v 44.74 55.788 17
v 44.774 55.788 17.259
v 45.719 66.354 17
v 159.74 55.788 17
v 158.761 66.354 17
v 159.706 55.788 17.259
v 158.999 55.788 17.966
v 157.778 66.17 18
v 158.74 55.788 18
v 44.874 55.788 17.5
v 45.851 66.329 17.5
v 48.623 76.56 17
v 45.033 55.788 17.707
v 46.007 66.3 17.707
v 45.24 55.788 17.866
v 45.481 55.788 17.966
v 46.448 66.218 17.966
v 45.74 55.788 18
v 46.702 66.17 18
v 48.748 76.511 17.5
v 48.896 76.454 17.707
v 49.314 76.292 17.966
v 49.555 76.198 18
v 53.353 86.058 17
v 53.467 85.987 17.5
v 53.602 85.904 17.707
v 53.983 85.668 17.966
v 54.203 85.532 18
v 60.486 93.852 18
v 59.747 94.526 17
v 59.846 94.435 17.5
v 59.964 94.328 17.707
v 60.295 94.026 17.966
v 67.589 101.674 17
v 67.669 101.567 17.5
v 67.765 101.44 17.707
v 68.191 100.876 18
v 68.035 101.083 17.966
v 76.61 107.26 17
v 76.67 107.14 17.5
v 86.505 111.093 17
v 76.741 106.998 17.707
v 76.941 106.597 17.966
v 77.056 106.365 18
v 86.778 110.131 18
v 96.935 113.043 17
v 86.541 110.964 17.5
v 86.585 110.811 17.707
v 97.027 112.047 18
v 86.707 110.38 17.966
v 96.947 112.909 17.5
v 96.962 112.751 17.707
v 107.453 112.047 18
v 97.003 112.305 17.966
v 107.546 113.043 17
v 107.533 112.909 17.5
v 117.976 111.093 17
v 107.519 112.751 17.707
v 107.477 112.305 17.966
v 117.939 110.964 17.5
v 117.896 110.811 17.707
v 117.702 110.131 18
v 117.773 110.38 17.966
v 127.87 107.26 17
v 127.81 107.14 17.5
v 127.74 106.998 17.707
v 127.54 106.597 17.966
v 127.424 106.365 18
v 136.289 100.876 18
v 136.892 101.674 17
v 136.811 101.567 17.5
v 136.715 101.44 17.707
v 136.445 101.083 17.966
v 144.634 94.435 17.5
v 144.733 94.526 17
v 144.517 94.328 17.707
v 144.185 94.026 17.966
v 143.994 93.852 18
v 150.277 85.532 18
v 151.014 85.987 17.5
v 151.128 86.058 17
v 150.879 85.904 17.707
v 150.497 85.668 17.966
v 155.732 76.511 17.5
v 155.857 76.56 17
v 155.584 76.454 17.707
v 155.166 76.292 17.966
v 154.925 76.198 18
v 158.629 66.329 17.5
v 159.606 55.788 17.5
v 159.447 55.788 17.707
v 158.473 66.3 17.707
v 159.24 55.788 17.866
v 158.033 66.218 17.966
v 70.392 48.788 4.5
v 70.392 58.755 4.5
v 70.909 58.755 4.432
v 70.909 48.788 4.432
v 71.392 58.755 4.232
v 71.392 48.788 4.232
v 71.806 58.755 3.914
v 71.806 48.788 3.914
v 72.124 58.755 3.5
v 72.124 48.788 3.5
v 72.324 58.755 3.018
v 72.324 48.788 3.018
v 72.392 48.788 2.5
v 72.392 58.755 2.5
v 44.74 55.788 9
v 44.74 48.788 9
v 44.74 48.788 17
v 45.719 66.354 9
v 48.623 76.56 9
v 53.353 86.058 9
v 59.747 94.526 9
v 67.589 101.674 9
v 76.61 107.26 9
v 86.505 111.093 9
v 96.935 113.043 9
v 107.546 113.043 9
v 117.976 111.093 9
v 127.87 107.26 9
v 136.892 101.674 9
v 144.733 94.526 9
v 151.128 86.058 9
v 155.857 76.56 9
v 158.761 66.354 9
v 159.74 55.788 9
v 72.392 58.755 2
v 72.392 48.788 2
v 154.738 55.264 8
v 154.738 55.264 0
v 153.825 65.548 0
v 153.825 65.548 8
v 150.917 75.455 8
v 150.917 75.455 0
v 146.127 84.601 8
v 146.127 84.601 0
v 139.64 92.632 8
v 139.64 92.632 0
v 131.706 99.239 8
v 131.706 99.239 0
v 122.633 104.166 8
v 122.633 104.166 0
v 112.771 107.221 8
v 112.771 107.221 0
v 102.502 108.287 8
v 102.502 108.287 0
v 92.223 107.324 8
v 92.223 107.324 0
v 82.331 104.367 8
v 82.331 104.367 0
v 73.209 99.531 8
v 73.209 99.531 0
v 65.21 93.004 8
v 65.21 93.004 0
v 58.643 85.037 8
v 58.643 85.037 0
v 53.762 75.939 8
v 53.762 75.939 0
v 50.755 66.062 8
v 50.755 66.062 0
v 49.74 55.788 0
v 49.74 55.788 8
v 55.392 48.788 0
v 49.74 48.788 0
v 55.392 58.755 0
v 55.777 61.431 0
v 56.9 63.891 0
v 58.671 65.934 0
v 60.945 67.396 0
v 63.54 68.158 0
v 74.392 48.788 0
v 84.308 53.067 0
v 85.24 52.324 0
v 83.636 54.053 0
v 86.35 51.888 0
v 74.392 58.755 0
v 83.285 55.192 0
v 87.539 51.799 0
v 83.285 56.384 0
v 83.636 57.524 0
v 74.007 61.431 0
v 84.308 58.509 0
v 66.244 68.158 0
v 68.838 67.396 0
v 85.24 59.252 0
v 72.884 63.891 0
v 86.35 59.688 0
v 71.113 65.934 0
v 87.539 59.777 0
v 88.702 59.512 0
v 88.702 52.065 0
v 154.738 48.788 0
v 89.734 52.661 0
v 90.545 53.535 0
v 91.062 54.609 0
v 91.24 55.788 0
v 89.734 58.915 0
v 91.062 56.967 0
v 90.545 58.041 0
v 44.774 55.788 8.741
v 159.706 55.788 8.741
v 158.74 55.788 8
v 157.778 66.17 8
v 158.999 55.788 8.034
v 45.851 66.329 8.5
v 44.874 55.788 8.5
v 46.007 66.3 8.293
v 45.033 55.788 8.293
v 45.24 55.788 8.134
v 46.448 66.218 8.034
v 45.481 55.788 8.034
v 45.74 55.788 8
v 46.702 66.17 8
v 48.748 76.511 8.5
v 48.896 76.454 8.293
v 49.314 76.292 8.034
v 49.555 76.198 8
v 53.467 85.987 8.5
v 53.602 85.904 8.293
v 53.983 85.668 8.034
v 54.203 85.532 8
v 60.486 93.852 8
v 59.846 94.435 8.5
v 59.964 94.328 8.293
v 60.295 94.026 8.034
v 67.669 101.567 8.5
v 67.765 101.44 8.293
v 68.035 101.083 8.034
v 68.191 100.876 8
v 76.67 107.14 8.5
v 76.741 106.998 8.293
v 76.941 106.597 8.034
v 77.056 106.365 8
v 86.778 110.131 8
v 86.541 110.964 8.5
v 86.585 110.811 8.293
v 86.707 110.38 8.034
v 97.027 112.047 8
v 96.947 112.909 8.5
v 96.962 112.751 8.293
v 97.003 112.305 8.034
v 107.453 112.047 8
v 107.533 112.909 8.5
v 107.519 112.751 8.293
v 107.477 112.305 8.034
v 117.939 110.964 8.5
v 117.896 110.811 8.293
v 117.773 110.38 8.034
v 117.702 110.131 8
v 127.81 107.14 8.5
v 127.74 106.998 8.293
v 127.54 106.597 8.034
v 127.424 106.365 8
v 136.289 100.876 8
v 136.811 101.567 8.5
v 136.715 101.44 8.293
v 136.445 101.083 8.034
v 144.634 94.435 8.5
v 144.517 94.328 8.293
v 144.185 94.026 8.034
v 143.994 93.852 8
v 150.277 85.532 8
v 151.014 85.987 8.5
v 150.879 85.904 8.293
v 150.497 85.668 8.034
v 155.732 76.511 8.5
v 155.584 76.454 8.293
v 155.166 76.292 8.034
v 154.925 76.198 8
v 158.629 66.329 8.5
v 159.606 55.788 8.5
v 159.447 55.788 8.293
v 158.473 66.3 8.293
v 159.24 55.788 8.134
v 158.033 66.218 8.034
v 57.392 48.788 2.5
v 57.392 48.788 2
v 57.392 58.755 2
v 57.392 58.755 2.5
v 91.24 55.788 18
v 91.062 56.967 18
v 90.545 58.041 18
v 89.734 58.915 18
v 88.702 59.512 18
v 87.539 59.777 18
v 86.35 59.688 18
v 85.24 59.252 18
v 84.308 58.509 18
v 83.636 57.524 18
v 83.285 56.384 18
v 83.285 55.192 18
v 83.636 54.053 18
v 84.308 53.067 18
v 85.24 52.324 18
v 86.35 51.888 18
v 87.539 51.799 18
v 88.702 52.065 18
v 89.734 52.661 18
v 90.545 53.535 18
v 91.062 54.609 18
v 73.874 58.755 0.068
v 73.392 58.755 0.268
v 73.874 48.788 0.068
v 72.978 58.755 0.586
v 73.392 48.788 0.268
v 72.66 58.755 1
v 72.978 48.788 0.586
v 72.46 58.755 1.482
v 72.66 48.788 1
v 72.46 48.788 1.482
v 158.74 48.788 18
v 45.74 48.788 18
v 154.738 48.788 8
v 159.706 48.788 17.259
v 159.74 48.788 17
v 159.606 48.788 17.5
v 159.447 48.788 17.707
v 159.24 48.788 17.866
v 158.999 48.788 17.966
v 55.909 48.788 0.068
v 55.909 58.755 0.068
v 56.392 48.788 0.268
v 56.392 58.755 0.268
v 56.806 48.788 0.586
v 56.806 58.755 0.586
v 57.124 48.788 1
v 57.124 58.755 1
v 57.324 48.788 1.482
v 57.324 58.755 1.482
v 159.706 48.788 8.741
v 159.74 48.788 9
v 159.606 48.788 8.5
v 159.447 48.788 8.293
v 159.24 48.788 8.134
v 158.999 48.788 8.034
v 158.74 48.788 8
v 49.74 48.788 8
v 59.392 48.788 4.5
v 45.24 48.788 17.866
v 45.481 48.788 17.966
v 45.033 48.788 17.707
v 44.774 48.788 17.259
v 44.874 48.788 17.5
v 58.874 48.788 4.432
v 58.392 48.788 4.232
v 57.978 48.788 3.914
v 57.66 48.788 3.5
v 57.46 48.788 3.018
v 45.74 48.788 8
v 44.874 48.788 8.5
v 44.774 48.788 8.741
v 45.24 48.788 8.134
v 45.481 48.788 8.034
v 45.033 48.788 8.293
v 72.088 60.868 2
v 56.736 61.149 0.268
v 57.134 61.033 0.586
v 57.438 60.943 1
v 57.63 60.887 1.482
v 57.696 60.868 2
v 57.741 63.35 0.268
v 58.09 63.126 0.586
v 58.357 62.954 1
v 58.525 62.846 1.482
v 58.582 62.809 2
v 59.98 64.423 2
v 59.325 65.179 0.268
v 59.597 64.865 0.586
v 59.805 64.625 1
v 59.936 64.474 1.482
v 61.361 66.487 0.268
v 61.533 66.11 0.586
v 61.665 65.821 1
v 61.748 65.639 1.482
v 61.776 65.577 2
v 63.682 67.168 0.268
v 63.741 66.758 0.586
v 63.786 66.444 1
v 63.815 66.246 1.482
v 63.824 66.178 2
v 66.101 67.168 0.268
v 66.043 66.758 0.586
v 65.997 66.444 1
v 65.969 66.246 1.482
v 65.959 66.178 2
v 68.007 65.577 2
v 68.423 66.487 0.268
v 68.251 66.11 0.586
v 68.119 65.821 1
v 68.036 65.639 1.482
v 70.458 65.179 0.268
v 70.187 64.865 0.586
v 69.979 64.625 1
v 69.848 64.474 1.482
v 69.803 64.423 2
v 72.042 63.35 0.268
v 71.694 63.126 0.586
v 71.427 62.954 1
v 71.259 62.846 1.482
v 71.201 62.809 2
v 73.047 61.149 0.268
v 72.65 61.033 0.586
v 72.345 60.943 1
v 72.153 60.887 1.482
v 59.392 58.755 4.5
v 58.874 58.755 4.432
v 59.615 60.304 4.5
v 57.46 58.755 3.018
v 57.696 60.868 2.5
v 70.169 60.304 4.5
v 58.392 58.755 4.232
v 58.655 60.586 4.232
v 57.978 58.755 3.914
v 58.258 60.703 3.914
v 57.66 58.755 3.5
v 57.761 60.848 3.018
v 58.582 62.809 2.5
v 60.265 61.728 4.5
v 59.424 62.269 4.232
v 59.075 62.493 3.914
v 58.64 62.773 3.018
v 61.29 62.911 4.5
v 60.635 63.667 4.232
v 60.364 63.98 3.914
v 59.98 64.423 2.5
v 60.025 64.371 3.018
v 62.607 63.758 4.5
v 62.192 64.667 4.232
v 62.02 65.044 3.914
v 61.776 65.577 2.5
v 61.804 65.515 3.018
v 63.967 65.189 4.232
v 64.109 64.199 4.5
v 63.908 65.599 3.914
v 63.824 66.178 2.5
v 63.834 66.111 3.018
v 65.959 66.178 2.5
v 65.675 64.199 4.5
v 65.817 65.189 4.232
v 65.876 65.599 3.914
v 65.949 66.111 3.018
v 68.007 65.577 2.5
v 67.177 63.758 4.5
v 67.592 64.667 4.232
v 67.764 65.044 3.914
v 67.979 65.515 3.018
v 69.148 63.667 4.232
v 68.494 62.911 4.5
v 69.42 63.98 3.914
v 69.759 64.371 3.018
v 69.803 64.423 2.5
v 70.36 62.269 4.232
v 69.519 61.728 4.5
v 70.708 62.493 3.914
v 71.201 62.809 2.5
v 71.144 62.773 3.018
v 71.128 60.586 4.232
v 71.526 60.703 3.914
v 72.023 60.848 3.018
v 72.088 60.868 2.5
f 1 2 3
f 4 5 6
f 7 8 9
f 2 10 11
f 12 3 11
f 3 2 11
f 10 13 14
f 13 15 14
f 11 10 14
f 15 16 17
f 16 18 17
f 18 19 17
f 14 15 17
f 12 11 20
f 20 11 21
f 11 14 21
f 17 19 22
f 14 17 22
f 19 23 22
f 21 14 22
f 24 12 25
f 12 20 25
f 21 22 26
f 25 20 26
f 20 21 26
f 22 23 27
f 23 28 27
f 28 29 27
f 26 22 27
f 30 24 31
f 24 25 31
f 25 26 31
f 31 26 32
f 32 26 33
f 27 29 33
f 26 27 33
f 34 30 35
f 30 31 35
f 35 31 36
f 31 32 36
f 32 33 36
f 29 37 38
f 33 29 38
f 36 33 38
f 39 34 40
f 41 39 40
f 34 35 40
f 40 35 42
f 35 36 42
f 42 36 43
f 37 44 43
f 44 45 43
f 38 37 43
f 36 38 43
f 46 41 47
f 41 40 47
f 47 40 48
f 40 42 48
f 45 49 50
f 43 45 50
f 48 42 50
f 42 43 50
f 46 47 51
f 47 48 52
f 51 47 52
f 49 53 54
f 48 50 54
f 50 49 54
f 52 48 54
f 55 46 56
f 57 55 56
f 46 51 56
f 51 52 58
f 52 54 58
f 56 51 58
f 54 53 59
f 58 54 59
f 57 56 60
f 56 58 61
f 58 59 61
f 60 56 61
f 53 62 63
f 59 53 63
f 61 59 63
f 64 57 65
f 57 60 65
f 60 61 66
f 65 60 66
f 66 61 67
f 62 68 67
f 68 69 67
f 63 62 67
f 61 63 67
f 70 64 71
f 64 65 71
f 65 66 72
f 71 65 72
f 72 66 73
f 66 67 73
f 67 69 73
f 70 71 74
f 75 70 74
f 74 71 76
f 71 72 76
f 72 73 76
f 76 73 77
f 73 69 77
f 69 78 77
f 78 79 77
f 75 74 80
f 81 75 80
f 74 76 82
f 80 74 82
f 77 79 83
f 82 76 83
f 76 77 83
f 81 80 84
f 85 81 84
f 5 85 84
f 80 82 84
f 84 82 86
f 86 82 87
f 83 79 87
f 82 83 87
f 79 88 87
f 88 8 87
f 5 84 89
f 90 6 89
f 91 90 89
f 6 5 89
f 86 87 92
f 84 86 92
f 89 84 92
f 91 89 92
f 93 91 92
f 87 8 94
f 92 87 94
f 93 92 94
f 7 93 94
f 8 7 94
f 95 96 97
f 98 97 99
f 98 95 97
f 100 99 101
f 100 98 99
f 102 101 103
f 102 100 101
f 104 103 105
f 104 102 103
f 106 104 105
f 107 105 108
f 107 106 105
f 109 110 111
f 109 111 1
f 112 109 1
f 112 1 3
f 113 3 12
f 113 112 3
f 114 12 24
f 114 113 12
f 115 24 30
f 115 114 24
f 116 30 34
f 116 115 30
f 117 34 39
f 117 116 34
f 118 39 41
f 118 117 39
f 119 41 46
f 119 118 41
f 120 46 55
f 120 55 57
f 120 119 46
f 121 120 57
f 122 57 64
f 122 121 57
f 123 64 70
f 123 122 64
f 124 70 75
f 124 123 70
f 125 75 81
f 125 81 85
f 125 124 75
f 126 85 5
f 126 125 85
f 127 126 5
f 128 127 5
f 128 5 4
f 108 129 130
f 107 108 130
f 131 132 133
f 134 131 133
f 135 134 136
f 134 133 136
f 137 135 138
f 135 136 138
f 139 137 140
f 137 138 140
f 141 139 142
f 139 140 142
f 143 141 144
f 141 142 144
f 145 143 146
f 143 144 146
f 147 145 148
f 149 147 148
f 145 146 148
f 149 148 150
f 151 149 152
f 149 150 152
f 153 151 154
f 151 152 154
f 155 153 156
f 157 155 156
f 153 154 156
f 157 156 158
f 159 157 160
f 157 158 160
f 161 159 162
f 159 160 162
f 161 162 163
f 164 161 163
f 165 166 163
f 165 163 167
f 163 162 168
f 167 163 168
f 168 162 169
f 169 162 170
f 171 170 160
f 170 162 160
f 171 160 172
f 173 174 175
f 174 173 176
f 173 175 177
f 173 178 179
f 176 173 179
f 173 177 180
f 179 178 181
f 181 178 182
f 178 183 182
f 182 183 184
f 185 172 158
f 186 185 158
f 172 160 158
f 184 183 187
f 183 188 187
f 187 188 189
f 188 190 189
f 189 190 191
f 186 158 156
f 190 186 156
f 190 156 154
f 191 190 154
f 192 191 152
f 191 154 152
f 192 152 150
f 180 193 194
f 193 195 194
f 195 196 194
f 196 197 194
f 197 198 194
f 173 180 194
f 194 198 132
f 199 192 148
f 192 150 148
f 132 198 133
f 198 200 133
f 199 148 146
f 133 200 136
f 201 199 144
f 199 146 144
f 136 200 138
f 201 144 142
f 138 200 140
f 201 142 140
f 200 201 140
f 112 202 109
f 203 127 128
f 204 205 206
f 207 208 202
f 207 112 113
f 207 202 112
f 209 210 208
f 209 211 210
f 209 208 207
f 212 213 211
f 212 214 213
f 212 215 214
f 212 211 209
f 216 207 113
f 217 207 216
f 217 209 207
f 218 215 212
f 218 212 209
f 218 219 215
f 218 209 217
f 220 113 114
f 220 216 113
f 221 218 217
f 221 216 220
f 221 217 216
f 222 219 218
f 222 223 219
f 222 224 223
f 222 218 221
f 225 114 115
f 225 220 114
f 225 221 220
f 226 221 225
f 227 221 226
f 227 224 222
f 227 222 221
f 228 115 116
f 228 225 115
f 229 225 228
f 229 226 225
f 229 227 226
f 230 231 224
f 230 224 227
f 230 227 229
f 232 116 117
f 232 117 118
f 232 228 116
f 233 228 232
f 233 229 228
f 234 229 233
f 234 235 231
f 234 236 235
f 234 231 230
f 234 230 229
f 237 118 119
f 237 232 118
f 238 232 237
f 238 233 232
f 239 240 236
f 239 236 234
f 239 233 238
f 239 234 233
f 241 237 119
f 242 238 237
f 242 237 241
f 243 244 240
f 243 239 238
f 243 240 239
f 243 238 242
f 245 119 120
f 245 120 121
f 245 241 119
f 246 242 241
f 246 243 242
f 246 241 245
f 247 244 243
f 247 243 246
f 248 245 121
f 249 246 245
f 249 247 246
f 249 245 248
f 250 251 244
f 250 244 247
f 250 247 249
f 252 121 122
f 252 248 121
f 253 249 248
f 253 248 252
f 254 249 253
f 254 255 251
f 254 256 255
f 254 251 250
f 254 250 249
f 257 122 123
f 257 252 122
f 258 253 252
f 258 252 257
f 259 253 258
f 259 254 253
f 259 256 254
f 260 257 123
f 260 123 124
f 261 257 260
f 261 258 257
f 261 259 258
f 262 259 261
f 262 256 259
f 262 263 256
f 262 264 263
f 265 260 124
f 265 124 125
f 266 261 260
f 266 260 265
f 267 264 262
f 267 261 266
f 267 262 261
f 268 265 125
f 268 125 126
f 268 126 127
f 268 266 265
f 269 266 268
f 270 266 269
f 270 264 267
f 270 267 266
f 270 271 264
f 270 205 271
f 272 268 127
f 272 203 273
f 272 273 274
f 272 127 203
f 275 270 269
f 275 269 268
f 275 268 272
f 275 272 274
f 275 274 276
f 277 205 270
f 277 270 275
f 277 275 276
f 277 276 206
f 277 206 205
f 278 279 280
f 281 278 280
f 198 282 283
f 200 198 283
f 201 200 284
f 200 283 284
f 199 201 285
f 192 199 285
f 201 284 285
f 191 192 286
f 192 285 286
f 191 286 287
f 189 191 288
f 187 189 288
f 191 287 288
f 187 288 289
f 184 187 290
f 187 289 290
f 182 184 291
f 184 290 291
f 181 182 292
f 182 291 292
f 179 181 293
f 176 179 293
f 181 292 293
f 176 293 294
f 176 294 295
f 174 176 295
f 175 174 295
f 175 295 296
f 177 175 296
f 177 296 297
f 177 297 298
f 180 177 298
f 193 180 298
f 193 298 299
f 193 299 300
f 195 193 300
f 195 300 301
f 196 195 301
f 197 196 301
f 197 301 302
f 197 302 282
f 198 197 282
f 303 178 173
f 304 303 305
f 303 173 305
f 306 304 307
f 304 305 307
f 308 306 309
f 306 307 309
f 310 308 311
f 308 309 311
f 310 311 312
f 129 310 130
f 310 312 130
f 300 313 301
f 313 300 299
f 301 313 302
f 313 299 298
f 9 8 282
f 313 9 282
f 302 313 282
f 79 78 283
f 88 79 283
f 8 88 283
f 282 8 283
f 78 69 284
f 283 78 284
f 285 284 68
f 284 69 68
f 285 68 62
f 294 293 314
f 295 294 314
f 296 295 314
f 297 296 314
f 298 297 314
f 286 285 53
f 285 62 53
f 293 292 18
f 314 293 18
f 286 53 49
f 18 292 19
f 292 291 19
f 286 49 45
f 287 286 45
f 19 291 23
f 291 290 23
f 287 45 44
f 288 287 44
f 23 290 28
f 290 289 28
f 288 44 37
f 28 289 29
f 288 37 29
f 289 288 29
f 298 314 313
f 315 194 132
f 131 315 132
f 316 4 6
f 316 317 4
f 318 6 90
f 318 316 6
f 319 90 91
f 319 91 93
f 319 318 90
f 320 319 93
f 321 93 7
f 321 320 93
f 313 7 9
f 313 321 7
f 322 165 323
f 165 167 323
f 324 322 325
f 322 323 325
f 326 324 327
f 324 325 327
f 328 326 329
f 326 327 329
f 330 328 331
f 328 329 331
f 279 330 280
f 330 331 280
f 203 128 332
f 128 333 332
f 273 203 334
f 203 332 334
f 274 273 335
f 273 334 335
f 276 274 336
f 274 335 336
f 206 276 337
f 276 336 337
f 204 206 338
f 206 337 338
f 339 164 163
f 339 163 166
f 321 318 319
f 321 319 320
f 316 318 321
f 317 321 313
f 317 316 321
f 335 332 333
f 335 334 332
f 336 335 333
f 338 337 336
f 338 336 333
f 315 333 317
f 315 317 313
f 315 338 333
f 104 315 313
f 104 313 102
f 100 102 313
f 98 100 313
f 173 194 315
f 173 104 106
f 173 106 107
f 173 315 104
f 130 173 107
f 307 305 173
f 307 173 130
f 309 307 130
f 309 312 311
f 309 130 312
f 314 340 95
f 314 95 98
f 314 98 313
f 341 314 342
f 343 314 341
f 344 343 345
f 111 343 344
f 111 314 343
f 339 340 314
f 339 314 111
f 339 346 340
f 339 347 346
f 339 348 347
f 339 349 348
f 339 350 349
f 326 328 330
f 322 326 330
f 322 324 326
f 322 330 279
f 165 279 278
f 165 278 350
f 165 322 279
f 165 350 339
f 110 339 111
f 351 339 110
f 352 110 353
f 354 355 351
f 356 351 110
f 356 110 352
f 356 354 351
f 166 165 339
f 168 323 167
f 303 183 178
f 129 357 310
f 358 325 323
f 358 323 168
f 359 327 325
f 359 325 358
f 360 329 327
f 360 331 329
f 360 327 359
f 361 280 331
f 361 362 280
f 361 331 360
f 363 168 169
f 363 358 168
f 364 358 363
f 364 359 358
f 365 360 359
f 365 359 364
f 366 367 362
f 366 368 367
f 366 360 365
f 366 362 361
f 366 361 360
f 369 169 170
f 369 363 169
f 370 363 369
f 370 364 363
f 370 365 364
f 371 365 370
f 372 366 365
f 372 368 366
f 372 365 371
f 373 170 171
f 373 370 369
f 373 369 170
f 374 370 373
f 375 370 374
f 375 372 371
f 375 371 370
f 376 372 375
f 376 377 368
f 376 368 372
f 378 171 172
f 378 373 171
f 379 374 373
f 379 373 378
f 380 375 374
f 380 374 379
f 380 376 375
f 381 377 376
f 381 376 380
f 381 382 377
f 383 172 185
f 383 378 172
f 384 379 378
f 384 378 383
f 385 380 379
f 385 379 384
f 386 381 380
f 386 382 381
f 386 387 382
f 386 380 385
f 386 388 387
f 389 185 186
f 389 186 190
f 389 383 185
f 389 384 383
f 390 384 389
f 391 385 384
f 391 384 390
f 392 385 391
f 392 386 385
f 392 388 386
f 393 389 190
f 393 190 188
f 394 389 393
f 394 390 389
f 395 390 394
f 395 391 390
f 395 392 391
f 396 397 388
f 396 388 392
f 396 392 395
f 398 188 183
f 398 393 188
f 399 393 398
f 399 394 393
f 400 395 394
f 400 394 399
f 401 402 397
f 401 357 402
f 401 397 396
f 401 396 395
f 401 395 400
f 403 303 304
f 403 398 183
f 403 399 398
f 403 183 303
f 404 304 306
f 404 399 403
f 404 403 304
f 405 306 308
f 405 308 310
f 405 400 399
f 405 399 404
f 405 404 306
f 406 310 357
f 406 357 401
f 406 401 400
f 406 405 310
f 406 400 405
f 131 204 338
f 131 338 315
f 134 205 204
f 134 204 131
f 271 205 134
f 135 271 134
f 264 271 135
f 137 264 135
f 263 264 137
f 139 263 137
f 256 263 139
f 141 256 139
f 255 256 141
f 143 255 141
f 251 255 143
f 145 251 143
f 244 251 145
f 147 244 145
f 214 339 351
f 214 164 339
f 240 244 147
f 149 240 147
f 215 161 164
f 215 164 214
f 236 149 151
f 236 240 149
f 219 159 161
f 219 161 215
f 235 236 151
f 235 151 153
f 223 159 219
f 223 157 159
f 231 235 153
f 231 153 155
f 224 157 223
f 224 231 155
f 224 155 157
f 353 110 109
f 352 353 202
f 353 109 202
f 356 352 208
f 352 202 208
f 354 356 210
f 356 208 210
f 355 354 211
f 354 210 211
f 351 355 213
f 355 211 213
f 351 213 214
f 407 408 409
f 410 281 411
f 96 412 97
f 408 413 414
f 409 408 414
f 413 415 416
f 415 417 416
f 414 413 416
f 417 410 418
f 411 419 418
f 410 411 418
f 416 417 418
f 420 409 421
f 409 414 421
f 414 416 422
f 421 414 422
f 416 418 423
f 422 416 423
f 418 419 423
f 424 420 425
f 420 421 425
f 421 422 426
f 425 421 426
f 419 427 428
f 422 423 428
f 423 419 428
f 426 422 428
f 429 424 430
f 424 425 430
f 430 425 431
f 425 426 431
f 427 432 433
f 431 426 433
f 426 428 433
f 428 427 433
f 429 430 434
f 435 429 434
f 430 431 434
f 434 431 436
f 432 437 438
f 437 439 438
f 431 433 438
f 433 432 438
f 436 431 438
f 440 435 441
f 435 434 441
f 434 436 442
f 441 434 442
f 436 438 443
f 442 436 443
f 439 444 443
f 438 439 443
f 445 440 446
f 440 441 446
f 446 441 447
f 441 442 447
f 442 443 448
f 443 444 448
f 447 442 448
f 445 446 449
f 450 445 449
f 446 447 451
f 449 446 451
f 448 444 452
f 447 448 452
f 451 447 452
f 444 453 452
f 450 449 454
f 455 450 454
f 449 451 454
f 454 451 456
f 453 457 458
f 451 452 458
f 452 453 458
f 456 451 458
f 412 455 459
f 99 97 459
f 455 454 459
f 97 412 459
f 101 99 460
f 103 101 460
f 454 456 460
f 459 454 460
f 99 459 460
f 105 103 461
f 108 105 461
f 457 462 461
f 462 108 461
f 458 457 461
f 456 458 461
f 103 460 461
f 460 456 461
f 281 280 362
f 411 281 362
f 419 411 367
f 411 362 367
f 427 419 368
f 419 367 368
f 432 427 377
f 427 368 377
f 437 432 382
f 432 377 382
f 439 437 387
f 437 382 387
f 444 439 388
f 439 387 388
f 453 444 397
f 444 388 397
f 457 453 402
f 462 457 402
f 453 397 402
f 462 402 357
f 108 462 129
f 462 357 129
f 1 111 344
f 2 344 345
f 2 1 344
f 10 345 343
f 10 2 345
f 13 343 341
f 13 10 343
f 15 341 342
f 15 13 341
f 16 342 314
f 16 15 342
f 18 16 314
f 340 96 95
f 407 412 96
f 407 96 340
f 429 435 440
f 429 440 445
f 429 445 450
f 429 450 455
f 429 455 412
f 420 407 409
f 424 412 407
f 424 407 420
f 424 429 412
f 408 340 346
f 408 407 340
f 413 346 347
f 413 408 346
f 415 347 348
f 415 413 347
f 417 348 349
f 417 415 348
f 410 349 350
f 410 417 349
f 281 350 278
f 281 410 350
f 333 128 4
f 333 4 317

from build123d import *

# Parameters (mm, degrees)
BOSS_EXTRUDE1_DEPTH = 8
BOSS_EXTRUDE2_DEPTH = 10
CUT_EXTRUDE1_REACH  = 20
SKETCH3_R           = 4
FILLET1_R           = 1
CUT_EXTRUDE3_DEPTH  = 4.5
FILLET2_R           = 2


with BuildPart() as part:
    # Sketch1 → Boss-Extrude1 (new body)
    with BuildSketch(Plane.XY):
        with BuildLine():
            Line((49.740147273, 55.788144293), (49.740147273, 48.788144293))
            Line((49.740147273, 48.788144293), (154.737534778, 48.788144293))
            Line((154.737534778, 48.788144293), (154.737534778, 55.264402854))
            ThreePointArc((154.737534778, 55.264402854), (102.50202125, 108.287491165), (49.740147273, 55.788144293))
        make_face()
    extrude(amount=BOSS_EXTRUDE1_DEPTH)

    # Sketch2 → Boss-Extrude2 (add)
    with BuildSketch(Plane.XY.offset(8)):
        with BuildLine():
            Line((159.740147273, 55.788144293), (159.740147273, 48.788144293))
            Line((159.740147273, 48.788144293), (44.740147273, 48.788144293))
            Line((44.740147273, 48.788144293), (44.740147273, 55.788144293))
            ThreePointArc((44.740147273, 55.788144293), (102.240147273, 113.288144293), (159.740147273, 55.788144293))
        make_face()
    extrude(amount=BOSS_EXTRUDE2_DEPTH)

    # Sketch3 → Cut-Extrude1 (cut, up to next)
    with BuildSketch(Plane.XY.offset(18), mode=Mode.PRIVATE) as cut_extrude1_sk1:
        with Locations((87.240147273, 55.788144293)):
            Circle(SKETCH3_R)
    cut_extrude1_tool1 = extrude(cut_extrude1_sk1.sketch, amount=-CUT_EXTRUDE1_REACH, mode=Mode.PRIVATE) & part.part
    add(cut_extrude1_tool1.solids().sort_by_distance((87.240147, 55.788144, 18))[0], mode=Mode.SUBTRACT)

    # Fillet1
    fillet1_edges = [part.edges().sort_by_distance(p)[0] for p in [
        (159.740147273, 52.288144293, 8),
        (44.740147273, 52.288144293, 8),
        (159.740147273, 52.288144293, 18),
        (44.740147273, 52.288144293, 18),
        (102.240147273, 113.288144293, 8),
        (102.240147273, 113.288144293, 18),
    ]]
    fillet(fillet1_edges, radius=FILLET1_R)

    # Sketch6 → Cut-Extrude3 (cut)
    with BuildSketch(Plane.XY):
        with BuildLine():
            Line((72.39178204, 48.788144293), (57.39178204, 48.788144293))
            Line((57.39178204, 48.788144293), (57.39178204, 58.754668066))
            ThreePointArc((57.39178204, 58.754668066), (64.89178204, 66.254668066), (72.39178204, 58.754668066))
            Line((72.39178204, 58.754668066), (72.39178204, 48.788144293))
        make_face()
    extrude(amount=CUT_EXTRUDE3_DEPTH, mode=Mode.SUBTRACT)

    # Fillet2
    fillet2_edges = [part.edges().sort_by_distance(p)[0] for p in [
        (64.89178204, 66.254668066, 0),
        (57.39178204, 53.771406179, 0),
        (72.39178204, 53.771406179, 0),
        (64.89178204, 66.254668066, 4.5),
        (57.39178204, 53.771406179, 4.5),
        (72.39178204, 53.771406179, 4.5),
    ]]
    fillet(fillet2_edges, radius=FILLET2_R)


solid = part.part
